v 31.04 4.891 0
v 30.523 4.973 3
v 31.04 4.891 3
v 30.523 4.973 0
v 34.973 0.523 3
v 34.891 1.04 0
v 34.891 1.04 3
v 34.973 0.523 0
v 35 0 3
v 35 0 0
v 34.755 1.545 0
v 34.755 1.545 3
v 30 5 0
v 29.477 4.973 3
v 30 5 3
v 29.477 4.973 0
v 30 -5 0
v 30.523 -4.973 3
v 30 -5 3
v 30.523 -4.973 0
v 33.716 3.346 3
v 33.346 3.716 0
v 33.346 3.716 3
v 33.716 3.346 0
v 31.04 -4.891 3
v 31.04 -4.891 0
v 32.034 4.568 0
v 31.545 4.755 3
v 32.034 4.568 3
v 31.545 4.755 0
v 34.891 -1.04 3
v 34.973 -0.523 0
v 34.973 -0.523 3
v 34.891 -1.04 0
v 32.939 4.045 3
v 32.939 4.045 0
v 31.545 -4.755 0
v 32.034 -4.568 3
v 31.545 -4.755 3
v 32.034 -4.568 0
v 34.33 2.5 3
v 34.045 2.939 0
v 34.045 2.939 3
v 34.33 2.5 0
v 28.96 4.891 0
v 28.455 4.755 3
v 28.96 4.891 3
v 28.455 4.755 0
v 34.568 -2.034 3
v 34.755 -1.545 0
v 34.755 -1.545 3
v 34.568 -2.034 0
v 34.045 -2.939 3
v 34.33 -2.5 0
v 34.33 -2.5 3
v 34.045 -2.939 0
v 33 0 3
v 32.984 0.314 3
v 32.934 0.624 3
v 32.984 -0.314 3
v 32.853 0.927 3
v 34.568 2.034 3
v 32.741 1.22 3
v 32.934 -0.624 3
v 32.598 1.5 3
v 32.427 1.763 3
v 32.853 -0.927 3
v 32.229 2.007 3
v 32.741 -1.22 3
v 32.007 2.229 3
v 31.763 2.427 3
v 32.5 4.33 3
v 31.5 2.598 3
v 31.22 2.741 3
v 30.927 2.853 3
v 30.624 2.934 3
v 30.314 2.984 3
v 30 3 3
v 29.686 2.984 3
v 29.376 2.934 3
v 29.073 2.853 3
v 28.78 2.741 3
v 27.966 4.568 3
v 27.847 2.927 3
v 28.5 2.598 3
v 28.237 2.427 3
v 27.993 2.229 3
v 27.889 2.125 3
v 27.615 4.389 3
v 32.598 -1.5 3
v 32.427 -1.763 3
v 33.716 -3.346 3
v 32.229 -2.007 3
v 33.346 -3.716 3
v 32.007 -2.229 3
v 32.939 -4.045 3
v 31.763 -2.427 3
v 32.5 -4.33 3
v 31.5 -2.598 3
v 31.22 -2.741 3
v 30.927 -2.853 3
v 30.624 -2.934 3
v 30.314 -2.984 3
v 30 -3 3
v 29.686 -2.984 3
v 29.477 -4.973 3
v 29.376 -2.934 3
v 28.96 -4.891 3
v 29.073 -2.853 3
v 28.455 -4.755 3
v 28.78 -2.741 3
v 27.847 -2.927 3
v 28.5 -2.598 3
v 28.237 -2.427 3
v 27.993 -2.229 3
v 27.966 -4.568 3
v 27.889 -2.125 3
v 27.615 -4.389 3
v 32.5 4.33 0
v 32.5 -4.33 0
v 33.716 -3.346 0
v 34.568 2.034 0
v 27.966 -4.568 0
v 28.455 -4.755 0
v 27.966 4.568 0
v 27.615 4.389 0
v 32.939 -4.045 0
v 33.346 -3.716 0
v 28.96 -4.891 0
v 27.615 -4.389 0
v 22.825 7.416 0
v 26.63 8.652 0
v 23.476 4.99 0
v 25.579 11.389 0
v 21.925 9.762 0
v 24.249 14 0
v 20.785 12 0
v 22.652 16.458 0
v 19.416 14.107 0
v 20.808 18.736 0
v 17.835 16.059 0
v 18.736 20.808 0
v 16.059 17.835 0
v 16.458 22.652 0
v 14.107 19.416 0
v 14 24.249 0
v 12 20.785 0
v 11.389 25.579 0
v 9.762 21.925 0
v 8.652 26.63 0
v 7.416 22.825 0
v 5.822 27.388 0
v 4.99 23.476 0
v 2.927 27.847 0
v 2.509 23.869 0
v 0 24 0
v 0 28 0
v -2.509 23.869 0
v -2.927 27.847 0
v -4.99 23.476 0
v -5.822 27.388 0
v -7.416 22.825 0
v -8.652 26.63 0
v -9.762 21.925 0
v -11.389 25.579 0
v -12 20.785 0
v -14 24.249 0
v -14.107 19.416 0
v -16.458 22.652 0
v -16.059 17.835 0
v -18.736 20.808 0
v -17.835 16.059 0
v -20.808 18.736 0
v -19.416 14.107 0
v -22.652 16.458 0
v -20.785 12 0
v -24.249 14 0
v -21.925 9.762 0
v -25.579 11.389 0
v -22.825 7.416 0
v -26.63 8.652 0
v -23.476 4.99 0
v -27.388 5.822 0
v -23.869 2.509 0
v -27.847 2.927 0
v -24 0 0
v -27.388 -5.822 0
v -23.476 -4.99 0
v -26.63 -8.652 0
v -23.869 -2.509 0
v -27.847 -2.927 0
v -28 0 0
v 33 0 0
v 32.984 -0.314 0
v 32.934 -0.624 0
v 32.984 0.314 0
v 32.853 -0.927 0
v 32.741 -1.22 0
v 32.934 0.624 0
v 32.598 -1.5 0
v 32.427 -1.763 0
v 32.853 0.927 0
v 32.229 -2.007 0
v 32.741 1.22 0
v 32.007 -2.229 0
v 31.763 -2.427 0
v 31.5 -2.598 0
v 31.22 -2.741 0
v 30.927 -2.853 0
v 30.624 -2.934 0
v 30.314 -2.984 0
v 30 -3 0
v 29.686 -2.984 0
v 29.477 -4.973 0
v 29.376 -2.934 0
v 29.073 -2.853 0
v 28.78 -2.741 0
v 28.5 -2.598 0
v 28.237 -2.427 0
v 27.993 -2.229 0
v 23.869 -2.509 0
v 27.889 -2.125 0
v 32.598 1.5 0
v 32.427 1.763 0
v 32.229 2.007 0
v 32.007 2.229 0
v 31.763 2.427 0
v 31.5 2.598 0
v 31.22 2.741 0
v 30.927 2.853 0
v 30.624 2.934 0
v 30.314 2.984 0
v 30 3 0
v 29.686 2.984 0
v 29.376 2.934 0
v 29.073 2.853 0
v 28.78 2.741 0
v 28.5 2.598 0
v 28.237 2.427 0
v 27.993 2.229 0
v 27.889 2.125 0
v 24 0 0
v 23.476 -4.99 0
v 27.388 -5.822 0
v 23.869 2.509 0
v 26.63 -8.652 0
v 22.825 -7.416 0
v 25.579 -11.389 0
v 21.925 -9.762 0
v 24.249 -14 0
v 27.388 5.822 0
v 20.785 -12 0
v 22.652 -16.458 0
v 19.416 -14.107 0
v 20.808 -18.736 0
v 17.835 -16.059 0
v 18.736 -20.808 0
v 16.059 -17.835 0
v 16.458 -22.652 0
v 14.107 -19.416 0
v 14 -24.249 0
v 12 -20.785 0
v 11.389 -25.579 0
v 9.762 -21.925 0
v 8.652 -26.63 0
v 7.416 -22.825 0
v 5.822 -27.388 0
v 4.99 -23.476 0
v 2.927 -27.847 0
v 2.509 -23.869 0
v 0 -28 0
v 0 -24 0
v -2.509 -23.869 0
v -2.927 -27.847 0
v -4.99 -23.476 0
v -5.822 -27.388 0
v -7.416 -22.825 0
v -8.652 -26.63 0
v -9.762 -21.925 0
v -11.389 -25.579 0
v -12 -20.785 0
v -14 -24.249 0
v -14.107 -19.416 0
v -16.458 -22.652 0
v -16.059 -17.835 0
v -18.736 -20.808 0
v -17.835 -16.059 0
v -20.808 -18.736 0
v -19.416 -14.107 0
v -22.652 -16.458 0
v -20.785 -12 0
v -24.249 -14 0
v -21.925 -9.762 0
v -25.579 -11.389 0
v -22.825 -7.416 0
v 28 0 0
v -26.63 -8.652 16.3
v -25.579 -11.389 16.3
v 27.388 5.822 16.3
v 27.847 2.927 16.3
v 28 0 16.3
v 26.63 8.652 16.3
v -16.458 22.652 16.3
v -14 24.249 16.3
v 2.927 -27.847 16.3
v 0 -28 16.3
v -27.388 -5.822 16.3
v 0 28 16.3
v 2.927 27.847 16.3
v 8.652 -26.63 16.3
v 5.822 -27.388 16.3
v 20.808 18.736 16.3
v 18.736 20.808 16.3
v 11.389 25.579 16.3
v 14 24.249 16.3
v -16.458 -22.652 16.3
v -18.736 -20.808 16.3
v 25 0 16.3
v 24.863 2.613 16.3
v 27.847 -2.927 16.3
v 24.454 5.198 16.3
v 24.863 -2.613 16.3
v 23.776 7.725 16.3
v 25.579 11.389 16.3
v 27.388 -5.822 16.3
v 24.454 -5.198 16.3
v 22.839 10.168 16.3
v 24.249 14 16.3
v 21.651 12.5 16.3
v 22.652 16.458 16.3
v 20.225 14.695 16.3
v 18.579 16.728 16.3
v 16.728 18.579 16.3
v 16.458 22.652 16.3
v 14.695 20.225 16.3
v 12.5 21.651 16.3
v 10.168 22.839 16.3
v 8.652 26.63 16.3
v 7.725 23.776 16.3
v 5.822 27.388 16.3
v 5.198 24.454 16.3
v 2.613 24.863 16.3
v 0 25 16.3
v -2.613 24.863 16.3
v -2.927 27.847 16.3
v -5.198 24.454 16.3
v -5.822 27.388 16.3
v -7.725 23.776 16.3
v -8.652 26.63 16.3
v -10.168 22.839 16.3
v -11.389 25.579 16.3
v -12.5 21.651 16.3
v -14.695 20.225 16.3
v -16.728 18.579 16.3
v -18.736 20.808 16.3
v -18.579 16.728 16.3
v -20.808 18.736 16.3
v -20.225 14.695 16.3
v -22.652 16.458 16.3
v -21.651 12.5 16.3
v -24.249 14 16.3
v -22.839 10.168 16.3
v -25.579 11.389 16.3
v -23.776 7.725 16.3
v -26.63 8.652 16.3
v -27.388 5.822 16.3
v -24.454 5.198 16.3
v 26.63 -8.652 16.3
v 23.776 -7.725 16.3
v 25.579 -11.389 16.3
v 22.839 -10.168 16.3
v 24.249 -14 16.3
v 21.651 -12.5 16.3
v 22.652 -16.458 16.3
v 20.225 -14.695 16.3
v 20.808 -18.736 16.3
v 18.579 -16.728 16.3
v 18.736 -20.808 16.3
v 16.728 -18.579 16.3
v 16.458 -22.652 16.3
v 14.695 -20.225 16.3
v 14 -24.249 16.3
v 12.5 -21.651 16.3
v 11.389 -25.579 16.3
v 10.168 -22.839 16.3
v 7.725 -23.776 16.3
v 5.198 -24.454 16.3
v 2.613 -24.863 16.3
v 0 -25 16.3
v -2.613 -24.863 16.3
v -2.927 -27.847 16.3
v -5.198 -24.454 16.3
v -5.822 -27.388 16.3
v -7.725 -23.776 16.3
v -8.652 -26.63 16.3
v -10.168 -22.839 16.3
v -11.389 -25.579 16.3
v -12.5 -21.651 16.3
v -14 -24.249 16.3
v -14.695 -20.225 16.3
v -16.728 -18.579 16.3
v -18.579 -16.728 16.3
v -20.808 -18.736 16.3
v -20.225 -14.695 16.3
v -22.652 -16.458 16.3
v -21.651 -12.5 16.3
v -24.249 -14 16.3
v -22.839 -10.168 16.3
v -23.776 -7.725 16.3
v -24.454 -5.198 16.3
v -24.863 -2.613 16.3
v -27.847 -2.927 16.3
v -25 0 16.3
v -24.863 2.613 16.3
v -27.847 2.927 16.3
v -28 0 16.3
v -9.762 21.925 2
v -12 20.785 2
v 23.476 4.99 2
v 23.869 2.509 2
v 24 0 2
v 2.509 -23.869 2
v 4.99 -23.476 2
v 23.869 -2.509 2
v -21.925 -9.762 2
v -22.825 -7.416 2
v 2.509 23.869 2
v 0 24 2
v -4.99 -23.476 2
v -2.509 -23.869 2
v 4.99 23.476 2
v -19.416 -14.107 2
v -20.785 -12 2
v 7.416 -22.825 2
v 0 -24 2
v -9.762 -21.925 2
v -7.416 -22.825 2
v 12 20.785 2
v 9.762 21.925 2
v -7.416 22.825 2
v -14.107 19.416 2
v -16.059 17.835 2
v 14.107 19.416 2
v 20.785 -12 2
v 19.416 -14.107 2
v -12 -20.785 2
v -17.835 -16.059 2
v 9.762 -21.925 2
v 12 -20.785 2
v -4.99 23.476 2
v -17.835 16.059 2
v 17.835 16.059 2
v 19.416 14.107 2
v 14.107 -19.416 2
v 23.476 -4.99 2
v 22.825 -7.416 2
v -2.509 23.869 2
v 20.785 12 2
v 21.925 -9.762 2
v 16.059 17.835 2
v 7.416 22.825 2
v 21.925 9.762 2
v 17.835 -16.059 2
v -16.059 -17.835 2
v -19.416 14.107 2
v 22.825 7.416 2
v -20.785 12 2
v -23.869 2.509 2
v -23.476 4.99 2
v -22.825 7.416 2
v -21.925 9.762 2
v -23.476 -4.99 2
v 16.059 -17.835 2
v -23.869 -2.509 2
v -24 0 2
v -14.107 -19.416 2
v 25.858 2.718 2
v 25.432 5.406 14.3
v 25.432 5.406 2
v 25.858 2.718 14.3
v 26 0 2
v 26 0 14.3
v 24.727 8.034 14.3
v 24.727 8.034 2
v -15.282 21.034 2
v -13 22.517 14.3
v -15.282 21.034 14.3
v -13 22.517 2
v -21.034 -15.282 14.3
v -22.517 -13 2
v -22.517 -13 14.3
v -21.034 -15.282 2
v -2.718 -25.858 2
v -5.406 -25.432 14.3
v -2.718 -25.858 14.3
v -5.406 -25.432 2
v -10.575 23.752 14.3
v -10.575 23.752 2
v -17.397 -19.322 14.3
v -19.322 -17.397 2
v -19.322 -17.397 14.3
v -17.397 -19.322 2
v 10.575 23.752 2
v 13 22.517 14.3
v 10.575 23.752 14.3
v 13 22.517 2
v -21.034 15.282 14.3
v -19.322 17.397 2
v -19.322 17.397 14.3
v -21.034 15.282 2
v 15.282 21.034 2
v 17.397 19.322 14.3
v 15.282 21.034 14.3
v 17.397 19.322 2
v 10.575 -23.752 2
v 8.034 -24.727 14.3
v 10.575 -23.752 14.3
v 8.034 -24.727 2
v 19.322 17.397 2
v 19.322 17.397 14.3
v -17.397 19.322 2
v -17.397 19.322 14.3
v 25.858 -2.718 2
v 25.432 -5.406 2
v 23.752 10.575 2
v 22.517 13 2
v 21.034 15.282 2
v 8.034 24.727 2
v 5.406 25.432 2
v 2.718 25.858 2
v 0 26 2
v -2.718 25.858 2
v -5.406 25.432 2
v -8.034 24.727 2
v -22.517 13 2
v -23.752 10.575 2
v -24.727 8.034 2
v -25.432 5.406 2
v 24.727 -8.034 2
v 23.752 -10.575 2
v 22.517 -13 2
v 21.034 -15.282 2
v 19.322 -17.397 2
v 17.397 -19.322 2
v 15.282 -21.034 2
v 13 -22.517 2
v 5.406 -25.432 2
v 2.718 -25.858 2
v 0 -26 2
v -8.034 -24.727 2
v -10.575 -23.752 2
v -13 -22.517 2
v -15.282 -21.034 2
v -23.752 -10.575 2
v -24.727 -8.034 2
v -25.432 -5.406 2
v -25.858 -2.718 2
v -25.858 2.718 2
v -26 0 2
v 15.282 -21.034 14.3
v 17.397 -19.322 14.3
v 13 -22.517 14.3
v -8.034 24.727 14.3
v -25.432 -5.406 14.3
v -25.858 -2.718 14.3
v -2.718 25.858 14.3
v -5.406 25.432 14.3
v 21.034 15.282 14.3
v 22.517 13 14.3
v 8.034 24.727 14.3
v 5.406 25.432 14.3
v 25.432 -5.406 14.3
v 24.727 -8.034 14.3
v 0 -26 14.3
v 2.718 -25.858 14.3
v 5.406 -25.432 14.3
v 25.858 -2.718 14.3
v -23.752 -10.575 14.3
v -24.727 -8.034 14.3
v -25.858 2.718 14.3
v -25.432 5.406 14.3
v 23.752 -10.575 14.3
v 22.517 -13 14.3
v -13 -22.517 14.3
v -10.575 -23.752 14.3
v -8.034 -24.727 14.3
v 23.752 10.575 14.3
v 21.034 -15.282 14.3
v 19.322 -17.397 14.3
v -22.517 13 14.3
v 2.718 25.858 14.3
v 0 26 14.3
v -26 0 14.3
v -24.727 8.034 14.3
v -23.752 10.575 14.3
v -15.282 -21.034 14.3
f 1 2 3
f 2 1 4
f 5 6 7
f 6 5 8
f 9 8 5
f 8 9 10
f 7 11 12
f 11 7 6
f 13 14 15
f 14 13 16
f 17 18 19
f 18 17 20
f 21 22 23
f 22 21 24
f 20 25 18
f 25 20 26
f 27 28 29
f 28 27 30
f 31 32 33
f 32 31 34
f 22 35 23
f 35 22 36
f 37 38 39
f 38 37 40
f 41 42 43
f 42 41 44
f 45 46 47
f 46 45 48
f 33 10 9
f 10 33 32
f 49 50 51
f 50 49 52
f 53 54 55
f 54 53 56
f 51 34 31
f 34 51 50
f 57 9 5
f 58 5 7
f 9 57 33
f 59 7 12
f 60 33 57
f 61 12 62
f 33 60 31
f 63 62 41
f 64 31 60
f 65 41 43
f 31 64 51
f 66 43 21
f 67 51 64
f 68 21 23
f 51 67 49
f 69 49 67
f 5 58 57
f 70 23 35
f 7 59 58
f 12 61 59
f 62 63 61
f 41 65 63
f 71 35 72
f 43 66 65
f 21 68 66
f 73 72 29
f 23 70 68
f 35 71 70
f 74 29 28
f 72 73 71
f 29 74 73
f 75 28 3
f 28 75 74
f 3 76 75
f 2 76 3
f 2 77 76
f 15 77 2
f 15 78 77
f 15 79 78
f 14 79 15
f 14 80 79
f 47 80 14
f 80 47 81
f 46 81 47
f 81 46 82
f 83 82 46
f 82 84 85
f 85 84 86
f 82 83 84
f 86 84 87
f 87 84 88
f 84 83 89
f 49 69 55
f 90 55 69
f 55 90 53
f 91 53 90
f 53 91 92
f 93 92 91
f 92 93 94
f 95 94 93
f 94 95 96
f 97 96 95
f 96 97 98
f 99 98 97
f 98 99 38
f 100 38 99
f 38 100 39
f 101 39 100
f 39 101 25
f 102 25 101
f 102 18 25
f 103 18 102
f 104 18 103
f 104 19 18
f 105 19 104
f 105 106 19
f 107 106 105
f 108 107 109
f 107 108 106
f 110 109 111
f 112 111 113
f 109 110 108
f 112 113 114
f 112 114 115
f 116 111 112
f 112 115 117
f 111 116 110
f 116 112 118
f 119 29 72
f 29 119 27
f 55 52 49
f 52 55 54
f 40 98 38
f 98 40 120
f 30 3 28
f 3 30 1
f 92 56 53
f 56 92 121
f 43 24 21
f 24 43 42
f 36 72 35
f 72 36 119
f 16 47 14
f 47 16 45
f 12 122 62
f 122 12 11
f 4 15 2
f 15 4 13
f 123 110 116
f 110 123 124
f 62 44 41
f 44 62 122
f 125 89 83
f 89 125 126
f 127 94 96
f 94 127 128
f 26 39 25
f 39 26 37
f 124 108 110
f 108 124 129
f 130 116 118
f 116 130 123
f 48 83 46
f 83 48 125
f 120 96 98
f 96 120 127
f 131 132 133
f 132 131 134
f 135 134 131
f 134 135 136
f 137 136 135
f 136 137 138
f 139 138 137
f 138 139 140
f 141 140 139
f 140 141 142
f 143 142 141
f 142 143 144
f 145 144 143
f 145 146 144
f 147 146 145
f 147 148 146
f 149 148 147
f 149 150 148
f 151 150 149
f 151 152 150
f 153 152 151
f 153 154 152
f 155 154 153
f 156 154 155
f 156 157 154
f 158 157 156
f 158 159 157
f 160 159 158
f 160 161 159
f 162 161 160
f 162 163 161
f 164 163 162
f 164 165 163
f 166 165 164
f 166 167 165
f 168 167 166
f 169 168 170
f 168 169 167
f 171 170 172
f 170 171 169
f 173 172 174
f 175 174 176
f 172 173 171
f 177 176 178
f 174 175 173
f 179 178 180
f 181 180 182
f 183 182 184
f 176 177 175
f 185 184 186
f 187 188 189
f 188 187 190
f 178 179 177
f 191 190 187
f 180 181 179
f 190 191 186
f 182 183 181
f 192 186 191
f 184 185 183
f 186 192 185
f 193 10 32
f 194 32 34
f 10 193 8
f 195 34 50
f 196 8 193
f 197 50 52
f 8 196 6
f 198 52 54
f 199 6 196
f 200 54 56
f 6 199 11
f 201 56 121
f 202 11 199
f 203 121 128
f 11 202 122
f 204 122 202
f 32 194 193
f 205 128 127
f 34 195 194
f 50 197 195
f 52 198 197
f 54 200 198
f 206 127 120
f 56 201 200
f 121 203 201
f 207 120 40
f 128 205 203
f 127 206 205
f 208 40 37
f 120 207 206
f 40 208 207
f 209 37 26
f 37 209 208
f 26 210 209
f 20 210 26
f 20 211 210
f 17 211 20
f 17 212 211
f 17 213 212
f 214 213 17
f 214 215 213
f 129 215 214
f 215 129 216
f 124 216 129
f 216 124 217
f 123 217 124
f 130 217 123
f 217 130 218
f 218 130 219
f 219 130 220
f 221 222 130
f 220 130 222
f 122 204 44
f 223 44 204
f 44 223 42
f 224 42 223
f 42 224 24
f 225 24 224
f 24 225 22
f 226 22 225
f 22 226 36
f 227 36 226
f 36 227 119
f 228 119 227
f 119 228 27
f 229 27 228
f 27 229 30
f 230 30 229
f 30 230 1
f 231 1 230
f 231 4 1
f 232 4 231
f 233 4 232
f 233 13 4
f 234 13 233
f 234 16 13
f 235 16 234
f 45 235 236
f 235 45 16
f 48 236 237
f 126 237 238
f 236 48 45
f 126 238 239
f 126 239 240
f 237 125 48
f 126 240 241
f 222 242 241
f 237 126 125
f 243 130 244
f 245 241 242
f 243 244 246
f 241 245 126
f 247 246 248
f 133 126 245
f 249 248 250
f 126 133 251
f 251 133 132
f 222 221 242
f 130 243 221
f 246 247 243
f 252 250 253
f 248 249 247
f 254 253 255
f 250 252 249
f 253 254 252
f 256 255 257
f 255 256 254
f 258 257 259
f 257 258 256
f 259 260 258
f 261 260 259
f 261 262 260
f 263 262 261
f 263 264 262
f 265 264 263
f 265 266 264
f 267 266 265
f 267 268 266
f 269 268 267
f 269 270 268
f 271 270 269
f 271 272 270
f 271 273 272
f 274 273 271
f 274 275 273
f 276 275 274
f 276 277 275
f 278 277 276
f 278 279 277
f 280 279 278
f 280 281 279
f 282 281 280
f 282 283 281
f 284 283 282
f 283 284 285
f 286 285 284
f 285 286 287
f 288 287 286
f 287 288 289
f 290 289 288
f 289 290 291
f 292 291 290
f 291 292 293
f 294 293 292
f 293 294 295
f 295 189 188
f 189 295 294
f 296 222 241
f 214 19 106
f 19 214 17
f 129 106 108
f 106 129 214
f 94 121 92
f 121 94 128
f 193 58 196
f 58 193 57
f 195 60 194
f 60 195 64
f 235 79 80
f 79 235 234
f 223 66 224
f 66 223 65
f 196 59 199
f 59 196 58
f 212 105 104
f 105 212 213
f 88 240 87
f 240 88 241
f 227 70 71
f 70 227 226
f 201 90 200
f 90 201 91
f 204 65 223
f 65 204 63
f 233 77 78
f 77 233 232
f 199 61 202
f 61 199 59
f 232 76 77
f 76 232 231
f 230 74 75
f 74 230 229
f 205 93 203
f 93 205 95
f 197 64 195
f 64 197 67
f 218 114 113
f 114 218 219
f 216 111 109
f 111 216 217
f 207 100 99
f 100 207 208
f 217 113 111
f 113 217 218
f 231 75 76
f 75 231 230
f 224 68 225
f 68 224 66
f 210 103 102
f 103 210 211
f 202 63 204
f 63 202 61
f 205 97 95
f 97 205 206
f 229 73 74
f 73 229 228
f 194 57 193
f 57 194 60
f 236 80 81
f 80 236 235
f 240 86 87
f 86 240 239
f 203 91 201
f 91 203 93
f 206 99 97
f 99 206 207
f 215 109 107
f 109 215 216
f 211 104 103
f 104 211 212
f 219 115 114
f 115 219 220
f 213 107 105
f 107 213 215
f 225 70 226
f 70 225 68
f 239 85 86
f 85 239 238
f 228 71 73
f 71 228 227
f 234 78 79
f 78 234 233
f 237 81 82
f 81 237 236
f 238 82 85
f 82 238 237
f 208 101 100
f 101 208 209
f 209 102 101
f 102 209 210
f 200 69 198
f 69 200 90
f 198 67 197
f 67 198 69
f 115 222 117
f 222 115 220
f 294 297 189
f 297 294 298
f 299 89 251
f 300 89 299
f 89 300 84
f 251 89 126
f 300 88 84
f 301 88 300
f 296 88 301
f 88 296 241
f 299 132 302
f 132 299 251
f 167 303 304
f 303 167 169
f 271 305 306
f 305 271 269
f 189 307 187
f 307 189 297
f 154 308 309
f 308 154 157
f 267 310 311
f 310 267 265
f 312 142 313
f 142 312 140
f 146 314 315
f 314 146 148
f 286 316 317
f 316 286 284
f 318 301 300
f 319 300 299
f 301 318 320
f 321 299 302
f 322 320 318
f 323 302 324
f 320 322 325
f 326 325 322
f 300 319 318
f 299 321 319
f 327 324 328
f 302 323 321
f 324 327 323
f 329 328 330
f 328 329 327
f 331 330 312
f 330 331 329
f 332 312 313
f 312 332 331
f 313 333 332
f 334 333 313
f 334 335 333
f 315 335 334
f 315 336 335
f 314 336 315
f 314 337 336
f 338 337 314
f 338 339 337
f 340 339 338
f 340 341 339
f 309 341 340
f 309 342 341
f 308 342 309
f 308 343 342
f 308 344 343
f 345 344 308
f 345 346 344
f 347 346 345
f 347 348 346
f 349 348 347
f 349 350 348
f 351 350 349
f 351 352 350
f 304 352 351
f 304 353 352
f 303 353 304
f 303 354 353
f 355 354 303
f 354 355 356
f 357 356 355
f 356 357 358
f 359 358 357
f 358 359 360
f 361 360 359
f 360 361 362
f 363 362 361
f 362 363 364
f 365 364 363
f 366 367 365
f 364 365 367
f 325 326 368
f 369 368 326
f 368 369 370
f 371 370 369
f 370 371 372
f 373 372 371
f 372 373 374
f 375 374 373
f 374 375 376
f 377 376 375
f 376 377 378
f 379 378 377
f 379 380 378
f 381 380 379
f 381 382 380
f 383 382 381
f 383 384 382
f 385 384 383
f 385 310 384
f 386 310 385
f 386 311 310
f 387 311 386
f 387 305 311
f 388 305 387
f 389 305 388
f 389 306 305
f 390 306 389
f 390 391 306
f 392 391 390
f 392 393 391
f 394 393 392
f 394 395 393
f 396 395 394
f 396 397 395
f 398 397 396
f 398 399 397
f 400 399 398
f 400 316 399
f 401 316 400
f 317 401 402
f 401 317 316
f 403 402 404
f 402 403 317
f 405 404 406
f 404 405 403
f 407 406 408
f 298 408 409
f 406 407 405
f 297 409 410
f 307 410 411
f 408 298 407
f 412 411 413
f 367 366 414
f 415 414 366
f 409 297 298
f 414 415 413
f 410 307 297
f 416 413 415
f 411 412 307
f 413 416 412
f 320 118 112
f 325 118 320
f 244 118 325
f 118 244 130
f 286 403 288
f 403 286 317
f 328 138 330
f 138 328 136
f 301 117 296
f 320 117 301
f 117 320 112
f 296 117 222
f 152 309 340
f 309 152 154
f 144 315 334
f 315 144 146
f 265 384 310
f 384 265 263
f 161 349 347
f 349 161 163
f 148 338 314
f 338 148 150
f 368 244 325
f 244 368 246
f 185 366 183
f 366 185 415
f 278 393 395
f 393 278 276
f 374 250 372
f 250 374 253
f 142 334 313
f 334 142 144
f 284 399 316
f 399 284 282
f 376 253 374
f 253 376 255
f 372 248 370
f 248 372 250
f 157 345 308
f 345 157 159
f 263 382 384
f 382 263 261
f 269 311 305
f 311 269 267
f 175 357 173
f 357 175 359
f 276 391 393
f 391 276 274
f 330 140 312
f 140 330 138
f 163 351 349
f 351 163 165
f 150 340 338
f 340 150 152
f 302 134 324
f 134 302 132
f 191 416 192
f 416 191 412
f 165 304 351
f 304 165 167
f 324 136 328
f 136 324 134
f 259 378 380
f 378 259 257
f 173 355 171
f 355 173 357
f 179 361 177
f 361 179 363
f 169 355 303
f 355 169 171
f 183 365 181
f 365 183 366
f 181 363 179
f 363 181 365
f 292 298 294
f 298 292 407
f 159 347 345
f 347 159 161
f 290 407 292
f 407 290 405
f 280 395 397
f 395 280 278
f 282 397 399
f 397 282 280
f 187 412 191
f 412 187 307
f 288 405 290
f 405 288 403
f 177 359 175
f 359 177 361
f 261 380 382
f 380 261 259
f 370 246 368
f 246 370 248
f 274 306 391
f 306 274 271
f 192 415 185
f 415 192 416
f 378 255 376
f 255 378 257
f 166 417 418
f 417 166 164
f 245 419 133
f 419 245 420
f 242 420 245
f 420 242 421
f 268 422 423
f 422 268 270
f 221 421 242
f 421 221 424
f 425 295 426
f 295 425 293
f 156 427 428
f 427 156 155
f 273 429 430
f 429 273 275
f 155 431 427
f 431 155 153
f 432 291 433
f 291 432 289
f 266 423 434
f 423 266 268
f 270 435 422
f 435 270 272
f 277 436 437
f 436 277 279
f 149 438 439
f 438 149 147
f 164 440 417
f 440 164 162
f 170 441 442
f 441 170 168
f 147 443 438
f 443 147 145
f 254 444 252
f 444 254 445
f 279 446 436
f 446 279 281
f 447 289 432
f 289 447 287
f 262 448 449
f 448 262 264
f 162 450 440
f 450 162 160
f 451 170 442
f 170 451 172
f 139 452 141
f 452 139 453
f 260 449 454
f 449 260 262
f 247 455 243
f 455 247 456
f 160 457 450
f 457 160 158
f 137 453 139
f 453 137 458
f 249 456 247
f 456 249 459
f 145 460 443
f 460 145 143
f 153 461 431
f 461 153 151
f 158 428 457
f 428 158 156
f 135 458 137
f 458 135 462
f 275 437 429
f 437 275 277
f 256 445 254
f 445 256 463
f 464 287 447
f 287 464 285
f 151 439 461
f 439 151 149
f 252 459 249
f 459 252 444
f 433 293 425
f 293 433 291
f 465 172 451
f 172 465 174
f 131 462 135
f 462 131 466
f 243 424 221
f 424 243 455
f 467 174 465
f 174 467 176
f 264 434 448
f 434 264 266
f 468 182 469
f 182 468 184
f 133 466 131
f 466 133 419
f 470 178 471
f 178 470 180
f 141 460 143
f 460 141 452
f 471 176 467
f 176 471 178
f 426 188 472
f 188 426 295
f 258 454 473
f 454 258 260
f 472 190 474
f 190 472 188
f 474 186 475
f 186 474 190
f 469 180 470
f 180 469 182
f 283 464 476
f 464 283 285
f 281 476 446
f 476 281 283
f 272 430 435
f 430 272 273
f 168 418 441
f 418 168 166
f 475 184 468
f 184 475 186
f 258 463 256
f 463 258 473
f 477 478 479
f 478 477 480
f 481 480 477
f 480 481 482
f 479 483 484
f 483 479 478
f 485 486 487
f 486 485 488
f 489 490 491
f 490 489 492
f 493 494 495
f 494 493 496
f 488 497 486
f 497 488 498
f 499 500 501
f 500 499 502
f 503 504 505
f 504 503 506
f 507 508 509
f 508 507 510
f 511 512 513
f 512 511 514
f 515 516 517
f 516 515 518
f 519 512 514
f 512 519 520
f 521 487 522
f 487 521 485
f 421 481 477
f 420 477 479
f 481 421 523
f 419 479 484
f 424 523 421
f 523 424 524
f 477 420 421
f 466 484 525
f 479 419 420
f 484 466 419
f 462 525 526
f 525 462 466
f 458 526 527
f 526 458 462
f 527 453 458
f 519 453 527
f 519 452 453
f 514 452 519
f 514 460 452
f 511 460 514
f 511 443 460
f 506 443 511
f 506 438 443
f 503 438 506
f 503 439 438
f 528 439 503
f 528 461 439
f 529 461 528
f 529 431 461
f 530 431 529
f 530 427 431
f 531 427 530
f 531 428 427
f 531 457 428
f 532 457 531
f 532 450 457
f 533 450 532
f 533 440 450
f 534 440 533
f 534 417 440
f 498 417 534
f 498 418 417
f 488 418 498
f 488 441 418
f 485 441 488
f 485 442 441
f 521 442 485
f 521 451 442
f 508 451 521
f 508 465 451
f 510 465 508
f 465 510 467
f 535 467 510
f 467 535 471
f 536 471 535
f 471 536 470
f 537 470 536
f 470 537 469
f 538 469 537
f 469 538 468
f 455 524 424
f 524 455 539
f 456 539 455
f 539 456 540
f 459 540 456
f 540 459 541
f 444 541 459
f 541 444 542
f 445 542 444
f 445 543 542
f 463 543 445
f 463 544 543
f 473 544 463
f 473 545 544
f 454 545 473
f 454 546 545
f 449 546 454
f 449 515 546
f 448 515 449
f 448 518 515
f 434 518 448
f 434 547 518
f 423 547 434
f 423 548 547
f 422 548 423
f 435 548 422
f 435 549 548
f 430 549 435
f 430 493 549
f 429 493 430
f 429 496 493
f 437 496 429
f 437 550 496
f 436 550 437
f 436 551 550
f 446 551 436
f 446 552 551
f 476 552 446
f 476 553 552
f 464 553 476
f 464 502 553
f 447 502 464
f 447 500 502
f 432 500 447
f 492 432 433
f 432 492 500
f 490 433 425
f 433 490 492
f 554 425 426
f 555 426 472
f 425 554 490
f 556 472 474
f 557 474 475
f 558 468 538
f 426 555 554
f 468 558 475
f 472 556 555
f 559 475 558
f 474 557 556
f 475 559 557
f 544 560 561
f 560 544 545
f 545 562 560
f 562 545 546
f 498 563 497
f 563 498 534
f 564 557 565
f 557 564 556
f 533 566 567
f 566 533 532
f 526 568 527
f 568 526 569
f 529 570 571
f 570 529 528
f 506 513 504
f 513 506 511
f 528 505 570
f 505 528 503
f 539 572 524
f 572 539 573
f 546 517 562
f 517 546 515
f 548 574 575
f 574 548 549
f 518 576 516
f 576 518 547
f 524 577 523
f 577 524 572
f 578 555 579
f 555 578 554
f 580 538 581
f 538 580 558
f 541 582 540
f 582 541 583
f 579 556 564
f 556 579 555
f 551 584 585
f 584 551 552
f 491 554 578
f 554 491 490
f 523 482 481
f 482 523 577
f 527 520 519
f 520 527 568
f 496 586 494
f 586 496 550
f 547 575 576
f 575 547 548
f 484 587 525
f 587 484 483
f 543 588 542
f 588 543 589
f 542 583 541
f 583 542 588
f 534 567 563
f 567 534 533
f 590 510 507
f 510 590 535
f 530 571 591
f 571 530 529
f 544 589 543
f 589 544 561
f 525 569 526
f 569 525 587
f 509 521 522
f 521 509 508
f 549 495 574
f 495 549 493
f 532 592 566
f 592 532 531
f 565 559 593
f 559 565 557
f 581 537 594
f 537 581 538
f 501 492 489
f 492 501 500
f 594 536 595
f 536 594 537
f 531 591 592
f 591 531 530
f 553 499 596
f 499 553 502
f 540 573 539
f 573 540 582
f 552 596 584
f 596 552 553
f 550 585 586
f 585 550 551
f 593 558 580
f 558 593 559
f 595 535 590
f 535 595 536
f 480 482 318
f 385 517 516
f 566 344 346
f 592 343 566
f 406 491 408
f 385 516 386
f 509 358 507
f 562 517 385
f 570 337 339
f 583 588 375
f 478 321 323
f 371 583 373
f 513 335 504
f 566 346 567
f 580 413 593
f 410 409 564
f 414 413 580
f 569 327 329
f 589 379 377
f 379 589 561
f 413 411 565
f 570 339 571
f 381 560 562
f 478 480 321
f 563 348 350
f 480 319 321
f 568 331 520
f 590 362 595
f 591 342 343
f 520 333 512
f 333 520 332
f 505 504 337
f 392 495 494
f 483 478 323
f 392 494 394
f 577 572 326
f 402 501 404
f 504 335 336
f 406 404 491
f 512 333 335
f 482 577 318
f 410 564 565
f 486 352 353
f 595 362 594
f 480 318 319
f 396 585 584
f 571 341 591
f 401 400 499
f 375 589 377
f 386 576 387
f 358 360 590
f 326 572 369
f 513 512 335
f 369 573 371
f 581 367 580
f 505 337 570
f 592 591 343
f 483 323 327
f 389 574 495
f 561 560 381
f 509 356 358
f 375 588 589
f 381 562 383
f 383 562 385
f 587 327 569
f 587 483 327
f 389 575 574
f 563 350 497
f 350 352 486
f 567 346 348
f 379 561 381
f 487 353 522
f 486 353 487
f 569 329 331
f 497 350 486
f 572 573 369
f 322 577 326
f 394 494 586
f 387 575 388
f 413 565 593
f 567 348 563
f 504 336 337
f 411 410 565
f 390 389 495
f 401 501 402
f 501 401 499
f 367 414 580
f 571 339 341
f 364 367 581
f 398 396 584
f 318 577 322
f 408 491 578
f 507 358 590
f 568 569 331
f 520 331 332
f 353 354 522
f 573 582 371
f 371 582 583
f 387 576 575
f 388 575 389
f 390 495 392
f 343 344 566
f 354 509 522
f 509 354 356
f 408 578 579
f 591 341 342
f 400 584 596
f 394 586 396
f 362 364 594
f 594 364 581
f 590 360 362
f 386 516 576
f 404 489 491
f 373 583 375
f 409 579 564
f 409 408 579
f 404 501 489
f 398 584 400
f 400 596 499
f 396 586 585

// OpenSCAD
// sleeve case for hanging a ruuvi tag

diameter = 52; // mm
height = 12.3; // mm
wall = 2; // mm

$fn=60;

difference() {
    union() {
        // main body
        cylinder(height + wall * 2, diameter/2 + wall, diameter/2 + wall);
        // hanger loop
        translate([diameter/2 + wall * 2, 0, 0]) {
            difference() {
                cylinder(3, 5, 5);
                cylinder(3, 3, 3);
            }
        }
    }

    // slice out the hole, leaving the lip
    cylinder(height + wall * 2, diameter/2 - wall, diameter/2 - wall);
    translate([0, 0, wall]) {
        cylinder(height, diameter/2, diameter/2);
    }
    translate([0,0, wall + height]) {
        cylinder(wall, diameter/2, diameter/2 - wall/2);
    }
}
